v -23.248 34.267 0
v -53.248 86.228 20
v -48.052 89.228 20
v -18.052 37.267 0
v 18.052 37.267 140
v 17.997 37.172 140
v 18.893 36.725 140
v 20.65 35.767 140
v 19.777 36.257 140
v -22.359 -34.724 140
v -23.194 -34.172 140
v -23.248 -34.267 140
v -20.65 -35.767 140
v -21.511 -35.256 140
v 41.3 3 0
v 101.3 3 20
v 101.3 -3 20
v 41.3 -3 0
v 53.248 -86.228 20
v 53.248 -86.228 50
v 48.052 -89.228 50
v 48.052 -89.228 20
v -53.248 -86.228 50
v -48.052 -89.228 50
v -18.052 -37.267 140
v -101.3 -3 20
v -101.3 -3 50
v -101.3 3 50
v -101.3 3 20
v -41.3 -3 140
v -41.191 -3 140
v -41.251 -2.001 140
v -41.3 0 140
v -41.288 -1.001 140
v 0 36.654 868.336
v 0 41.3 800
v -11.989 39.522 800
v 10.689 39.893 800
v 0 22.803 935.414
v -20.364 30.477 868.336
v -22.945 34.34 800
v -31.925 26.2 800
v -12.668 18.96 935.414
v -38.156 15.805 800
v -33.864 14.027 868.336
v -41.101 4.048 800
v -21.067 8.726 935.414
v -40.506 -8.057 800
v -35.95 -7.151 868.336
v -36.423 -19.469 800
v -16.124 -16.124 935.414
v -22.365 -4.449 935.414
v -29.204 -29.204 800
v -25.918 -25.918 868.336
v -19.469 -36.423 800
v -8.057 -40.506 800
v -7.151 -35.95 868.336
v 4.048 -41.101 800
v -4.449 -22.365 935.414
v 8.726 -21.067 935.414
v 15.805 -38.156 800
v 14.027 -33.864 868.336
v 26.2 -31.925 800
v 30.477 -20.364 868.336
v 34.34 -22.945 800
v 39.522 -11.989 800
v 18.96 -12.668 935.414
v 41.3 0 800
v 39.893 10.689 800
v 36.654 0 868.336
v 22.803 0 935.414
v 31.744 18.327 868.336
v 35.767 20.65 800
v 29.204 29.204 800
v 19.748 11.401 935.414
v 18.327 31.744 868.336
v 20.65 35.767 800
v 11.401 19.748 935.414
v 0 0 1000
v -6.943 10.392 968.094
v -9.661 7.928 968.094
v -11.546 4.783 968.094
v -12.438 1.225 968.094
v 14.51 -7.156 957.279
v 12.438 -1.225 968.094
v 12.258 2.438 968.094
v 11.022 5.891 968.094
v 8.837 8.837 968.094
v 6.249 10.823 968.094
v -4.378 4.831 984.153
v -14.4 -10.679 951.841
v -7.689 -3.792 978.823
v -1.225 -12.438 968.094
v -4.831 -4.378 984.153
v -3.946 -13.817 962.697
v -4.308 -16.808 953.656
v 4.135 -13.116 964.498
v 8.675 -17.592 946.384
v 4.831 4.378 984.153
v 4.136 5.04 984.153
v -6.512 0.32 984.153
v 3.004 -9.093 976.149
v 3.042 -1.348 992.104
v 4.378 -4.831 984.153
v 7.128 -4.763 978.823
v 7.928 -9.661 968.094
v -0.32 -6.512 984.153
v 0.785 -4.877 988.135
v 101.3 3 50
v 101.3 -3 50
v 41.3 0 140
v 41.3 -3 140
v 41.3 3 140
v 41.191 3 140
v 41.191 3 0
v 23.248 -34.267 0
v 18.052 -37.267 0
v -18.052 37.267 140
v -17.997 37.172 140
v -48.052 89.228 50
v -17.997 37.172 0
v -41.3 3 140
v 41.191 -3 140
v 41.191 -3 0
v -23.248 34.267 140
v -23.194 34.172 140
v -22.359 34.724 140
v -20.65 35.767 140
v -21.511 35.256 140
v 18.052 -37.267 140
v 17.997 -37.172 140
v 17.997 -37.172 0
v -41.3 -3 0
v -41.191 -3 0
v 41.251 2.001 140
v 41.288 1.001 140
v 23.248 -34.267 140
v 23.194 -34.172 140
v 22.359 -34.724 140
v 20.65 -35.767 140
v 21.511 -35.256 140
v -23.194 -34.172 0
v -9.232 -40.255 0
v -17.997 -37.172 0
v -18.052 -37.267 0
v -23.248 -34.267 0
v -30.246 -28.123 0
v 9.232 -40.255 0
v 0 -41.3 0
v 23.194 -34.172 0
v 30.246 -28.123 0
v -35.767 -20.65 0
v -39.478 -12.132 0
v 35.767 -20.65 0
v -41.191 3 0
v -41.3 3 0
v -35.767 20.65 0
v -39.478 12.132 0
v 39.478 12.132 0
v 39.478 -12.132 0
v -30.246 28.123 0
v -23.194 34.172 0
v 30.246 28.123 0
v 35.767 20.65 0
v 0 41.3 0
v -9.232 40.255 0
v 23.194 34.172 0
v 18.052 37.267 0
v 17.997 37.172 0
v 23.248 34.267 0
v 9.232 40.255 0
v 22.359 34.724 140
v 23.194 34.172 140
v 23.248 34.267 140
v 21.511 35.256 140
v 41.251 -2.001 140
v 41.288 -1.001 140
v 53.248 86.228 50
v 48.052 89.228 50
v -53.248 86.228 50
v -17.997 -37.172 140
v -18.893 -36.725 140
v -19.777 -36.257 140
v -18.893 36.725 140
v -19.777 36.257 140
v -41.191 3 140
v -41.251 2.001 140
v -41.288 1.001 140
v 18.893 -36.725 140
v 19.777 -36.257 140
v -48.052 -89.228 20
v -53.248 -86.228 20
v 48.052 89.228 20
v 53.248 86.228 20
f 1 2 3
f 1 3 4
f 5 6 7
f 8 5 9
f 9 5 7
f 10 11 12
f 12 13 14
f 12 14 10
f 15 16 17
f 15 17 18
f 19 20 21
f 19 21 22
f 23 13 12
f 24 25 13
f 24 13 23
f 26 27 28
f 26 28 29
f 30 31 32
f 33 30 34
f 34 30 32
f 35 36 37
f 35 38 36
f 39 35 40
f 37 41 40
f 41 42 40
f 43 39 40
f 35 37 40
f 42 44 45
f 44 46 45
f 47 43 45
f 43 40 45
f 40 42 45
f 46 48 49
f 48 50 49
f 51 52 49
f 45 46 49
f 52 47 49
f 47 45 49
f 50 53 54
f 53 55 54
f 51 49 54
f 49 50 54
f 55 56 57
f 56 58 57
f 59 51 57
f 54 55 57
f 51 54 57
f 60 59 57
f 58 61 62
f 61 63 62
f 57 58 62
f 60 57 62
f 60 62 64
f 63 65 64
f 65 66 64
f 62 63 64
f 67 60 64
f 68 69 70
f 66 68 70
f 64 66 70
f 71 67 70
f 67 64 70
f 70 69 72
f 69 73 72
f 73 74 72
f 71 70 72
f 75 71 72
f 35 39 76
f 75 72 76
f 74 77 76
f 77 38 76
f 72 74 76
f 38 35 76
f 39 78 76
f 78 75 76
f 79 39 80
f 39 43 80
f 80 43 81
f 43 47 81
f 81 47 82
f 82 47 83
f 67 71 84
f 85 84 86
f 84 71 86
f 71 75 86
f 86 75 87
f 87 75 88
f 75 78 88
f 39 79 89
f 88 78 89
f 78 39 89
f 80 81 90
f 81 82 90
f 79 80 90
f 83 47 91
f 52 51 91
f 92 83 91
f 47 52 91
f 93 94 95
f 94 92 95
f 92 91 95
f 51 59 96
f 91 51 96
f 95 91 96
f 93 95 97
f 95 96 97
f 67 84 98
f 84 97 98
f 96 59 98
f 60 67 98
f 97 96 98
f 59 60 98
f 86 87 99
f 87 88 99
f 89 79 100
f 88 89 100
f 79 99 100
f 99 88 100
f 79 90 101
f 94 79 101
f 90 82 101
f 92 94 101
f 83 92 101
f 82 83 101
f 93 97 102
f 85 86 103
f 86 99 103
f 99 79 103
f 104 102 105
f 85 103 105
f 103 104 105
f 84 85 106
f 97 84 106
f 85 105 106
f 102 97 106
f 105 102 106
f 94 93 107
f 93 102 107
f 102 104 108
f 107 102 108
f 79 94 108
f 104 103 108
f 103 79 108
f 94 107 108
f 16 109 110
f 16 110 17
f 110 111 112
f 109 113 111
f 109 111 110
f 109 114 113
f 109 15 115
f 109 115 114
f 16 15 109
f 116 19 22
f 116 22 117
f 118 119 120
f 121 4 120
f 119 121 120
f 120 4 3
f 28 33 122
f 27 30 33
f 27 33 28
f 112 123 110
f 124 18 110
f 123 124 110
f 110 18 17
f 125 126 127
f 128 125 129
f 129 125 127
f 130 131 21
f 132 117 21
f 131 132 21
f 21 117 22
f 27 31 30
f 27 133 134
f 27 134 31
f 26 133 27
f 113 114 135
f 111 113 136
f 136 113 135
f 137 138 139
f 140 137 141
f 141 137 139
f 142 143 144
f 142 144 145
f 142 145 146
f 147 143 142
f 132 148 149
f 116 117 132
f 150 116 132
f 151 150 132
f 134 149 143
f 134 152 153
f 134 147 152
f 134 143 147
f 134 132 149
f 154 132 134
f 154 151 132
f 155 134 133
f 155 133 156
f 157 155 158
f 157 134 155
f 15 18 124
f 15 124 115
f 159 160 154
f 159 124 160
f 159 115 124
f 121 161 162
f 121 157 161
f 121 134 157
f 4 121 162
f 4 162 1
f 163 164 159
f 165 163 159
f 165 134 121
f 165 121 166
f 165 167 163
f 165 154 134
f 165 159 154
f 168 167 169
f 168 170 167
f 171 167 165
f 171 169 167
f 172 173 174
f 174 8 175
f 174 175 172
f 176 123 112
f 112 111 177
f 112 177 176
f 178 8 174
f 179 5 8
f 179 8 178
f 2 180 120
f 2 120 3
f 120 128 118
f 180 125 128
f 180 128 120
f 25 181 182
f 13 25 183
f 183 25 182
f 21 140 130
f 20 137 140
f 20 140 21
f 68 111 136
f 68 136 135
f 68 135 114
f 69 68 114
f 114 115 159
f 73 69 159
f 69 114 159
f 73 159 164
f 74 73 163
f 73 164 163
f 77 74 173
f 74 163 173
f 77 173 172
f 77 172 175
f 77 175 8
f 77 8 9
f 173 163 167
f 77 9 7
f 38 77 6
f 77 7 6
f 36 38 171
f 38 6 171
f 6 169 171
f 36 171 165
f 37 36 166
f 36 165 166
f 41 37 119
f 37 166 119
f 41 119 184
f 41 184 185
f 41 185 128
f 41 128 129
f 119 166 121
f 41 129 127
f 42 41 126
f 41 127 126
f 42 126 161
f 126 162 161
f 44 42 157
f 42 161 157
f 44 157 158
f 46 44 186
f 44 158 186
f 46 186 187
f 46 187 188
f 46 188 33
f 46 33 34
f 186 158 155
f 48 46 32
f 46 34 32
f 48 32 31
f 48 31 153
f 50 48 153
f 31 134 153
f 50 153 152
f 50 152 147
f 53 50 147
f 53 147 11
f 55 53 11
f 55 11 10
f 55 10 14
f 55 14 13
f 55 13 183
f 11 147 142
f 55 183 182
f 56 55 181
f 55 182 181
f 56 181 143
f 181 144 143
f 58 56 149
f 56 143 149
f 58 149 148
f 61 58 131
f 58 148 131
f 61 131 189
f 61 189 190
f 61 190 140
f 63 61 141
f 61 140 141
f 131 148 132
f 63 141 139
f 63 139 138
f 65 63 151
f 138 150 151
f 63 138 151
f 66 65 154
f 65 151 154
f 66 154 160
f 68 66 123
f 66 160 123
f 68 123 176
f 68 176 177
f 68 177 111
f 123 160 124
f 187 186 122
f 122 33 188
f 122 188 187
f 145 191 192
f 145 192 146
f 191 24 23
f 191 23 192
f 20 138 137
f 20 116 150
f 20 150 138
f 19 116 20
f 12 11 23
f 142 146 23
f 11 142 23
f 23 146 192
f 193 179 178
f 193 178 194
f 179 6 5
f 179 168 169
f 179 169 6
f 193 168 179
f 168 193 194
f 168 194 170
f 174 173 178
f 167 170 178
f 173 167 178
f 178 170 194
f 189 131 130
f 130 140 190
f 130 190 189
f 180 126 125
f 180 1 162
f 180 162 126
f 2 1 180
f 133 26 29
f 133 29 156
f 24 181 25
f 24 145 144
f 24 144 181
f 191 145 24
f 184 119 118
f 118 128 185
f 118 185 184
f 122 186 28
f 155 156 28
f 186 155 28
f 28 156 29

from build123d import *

# Parameters (mm, degrees)
SKETCH1_R           = 41.3
BOSS_EXTRUDE1_DEPTH = 800
BOSS_EXTRUDE2_DEPTH = 3
CIRPATTERN1_COUNT   = 6


with BuildPart() as part:
    # Sketch1 → Boss-Extrude1 (new body)
    with BuildSketch(Plane.XY):
        Circle(SKETCH1_R)
    extrude(amount=BOSS_EXTRUDE1_DEPTH)

    # Sketch2 → Revolve1 (revolve)
    with BuildSketch(Plane(origin=(0, 0, 0), x_dir=(0, 0, -1), z_dir=(1, 0, 0))):
        with BuildLine():
            Line((-800, 0), (-1000, 0))
            ThreePointArc((-1000, 0), (-902.109855058, 30.867215778), (-800, 41.3))
            Line((-800, 41.3), (-800, 0))
        make_face()
    revolve(axis=Axis((0, 0, 800), (0, 0, 1)))

    # Sketch3 → Boss-Extrude2 (add, symmetric)
    with BuildSketch(Plane(origin=(0, 0, 0), x_dir=(1, 0, 0), z_dir=(0, 1, 0))):
        Polygon((41.3, -140), (101.3, -50), (101.3, -20), (41.3, 0), (0, 0), (0, -140), align=None)
    boss_extrude2 = extrude(amount=BOSS_EXTRUDE2_DEPTH, both=True)

    # CirPattern1: Boss-Extrude2 ×6 about axis
    cirpattern1_axis = Axis((0, 0, 0), (0, 0, 1))
    for i in range(1, CIRPATTERN1_COUNT):
        add(boss_extrude2.rotate(cirpattern1_axis, i * 360 / CIRPATTERN1_COUNT))


solid = part.part
